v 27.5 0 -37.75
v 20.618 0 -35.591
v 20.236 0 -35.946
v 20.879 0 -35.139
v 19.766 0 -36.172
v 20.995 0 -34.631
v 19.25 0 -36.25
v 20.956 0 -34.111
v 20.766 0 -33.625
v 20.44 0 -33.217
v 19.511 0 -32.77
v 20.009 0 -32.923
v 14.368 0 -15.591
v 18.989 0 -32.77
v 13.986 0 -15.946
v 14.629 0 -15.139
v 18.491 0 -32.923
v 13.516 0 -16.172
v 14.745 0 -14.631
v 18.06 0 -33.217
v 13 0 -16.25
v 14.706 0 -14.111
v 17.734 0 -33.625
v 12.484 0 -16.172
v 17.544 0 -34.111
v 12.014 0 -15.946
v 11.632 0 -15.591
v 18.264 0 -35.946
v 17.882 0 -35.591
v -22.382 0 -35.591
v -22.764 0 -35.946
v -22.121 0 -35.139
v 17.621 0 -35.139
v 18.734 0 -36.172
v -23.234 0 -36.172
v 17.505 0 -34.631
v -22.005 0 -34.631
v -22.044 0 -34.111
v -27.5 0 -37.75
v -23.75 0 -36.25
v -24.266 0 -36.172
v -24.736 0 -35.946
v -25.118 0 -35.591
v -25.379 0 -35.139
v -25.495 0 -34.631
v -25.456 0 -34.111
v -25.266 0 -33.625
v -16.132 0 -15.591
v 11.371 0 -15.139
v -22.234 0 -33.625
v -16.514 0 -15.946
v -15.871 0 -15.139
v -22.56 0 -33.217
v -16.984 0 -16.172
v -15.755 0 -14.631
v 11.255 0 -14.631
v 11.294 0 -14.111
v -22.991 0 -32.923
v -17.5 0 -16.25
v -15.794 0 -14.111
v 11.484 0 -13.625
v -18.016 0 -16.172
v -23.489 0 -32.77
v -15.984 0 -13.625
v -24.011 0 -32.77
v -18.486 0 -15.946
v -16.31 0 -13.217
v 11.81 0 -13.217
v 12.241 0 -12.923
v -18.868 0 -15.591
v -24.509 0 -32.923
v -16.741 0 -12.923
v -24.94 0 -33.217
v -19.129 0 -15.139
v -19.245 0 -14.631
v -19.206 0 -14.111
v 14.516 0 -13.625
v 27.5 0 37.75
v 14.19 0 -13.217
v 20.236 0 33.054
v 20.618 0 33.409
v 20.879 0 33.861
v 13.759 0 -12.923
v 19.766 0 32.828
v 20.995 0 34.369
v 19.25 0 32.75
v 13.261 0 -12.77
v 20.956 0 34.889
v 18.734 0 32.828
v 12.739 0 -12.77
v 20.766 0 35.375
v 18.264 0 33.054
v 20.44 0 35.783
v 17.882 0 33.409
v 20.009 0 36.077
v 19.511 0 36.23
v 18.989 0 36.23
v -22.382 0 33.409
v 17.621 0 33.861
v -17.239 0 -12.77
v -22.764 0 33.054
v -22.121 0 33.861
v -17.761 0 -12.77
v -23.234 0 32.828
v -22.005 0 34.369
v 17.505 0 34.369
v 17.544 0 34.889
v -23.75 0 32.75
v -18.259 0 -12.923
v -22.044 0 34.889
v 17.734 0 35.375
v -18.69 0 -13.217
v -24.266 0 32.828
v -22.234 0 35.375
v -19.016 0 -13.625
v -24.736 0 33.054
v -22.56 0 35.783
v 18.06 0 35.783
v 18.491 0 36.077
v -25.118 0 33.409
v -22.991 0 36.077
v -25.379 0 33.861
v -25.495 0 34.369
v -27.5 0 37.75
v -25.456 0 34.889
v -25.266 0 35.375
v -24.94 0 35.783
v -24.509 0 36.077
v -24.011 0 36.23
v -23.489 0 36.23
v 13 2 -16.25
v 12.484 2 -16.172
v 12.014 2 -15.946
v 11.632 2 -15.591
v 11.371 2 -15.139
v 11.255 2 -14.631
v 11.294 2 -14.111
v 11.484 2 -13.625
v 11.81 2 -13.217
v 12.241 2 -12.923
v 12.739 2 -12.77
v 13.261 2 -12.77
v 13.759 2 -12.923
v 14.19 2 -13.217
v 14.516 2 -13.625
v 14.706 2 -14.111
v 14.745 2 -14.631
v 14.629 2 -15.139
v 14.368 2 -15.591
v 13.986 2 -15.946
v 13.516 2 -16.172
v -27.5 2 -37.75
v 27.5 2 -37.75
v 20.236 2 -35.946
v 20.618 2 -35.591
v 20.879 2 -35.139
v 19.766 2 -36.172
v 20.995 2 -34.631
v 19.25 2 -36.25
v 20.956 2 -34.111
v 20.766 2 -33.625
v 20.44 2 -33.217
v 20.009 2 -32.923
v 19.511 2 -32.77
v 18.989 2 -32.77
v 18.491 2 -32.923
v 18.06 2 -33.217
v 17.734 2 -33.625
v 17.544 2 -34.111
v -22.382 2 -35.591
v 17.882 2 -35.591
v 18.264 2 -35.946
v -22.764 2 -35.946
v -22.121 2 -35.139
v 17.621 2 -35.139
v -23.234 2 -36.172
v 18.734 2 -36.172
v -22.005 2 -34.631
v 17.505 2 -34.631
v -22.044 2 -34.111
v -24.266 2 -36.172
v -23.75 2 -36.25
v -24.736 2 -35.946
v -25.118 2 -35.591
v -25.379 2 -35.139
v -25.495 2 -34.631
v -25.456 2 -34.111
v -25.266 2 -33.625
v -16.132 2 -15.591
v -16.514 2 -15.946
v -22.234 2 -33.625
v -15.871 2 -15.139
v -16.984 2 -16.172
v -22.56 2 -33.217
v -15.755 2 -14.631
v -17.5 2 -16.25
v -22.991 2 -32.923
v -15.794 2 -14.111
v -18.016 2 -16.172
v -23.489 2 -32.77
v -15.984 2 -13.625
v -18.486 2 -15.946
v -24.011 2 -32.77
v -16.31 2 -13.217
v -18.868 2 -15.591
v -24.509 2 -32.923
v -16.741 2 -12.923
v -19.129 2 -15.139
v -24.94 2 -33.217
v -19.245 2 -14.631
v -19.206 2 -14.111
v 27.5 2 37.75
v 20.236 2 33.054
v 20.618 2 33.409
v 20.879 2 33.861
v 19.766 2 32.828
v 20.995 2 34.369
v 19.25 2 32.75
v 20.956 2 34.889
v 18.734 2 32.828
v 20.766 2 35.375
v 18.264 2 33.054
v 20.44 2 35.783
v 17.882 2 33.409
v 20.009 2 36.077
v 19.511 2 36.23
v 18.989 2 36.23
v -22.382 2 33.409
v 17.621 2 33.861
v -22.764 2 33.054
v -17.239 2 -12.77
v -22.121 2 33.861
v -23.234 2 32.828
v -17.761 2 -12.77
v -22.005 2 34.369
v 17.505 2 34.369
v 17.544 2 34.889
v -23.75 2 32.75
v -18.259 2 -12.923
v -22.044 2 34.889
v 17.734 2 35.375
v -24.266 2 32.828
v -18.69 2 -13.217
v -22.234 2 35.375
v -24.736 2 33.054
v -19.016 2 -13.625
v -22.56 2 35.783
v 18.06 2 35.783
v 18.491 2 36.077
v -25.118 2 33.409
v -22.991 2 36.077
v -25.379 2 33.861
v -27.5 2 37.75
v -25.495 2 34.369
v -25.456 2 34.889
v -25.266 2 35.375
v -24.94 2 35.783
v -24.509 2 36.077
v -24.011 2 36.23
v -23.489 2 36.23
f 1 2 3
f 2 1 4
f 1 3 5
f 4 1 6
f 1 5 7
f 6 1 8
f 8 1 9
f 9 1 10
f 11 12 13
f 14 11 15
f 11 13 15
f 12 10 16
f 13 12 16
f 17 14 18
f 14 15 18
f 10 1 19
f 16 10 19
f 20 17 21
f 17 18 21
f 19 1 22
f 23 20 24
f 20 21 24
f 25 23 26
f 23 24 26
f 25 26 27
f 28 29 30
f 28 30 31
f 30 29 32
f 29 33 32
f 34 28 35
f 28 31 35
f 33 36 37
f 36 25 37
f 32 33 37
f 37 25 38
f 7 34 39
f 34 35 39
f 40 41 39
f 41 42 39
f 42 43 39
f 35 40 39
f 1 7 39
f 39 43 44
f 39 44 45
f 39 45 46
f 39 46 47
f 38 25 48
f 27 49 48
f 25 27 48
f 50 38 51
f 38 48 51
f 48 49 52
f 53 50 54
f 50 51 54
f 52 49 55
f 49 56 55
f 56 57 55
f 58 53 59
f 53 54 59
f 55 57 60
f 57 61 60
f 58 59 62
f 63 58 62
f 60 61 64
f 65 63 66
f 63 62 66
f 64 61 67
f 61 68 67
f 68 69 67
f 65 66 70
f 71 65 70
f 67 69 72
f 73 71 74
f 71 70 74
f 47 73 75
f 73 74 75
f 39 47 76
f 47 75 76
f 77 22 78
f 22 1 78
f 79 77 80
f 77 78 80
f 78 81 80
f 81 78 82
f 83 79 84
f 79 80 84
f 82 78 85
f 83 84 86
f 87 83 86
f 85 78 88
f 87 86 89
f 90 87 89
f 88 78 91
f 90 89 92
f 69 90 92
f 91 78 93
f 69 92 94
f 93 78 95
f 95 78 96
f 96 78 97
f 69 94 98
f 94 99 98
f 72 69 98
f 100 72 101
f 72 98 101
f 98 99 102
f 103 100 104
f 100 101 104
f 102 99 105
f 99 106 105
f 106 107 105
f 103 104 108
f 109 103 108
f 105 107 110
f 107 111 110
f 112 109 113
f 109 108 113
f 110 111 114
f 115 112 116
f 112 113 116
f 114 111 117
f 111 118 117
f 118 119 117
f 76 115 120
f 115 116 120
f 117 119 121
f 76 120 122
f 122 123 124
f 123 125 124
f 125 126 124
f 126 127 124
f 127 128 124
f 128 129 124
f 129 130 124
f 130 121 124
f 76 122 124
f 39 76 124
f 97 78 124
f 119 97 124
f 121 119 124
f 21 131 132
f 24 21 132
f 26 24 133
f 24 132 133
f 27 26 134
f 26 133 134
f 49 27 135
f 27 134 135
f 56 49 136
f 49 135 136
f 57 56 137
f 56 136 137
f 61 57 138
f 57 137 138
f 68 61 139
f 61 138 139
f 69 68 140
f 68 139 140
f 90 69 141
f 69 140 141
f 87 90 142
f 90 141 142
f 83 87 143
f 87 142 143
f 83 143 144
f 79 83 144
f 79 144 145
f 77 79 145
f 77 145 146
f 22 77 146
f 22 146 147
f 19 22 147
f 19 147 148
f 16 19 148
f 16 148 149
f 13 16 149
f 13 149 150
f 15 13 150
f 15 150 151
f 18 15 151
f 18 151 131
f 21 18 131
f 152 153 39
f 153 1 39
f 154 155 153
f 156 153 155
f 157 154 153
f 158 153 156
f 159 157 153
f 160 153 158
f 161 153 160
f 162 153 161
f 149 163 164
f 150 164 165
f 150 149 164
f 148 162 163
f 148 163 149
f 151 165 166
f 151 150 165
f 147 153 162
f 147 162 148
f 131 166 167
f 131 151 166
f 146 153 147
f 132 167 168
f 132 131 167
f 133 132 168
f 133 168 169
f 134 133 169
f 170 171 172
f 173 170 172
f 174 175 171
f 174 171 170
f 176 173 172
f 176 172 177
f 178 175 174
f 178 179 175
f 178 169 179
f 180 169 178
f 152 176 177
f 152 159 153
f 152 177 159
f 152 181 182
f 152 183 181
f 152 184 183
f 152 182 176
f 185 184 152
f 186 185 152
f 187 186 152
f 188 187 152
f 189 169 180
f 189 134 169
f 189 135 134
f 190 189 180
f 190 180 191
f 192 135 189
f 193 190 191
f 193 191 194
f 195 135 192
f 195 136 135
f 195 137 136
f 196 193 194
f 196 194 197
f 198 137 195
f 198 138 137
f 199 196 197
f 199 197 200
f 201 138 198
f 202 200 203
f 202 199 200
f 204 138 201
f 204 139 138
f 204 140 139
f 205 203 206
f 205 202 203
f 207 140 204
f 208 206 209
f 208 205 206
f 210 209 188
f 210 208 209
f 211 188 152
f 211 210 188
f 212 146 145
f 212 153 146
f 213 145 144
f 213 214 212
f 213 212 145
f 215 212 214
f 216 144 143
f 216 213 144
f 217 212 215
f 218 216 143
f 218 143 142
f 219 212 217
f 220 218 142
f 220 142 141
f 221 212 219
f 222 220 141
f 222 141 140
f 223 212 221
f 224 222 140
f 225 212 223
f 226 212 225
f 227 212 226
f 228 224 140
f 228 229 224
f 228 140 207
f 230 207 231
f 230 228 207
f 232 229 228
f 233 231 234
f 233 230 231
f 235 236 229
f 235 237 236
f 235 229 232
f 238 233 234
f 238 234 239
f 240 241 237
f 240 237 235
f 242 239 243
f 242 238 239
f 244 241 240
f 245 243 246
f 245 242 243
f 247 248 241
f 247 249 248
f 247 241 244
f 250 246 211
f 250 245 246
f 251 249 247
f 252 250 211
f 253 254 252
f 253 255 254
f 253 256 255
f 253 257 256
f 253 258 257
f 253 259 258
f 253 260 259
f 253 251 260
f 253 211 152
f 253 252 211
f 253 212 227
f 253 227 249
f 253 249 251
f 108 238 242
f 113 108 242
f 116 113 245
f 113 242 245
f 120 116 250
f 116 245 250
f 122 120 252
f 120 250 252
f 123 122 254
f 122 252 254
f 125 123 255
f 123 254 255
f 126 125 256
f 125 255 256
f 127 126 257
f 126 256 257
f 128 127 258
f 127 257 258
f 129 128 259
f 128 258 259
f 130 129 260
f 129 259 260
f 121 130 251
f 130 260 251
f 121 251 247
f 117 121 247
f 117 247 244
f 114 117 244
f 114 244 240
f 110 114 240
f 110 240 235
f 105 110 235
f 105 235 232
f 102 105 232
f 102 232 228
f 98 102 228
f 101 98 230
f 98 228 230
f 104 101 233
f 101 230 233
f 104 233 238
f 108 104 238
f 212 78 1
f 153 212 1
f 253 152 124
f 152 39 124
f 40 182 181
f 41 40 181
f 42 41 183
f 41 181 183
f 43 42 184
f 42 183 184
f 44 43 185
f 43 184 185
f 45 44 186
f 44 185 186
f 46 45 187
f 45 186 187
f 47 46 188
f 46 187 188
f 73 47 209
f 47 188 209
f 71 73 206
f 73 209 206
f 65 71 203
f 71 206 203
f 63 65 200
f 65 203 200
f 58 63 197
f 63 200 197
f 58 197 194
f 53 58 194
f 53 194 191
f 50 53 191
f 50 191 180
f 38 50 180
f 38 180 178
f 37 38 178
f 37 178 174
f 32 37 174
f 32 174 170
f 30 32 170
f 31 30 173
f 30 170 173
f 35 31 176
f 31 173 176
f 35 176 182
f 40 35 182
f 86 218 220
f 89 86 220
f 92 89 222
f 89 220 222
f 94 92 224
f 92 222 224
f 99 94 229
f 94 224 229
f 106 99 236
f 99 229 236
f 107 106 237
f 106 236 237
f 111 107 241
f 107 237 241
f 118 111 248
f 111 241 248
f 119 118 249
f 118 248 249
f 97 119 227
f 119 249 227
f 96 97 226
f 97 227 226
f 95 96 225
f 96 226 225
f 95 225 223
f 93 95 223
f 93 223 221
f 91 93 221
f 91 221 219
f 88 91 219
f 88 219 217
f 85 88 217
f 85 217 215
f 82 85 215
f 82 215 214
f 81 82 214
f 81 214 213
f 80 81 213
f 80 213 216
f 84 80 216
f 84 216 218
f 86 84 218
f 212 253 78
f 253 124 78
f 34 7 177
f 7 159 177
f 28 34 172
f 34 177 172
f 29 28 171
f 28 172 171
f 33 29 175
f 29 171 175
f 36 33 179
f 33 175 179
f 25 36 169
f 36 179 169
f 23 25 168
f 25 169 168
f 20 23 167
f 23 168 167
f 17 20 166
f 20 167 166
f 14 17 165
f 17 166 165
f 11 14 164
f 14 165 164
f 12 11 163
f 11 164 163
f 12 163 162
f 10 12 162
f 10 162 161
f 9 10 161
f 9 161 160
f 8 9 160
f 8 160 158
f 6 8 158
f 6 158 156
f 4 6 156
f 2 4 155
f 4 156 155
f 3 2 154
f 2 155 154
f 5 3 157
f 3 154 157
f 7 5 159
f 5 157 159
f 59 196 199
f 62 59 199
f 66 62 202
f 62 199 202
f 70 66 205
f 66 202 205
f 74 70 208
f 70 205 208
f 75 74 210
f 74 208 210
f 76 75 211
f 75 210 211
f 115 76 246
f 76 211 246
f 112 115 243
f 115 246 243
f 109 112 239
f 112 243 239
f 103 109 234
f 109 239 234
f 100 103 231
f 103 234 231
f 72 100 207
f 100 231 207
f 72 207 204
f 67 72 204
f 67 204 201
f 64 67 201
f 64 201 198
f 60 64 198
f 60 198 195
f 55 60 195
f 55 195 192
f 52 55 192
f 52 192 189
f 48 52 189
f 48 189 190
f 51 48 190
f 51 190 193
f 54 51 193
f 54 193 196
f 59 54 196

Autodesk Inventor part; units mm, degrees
ref_plane "YZ Plane" through (0, 0, 0) normal (1, 0, 0) x (0, 1, 0)
ref_plane "XZ Plane" through (0, 0, 0) normal (0, 1, 0) x (-1, 0, 0)
ref_plane "XY Plane" through (0, 0, 0) normal (0, 0, 1) x (1, 0, 0)
sketch "Szkic1" plane through (0, 0, 0) normal (0, 1, 0) x (-1, 0, 0)
  line L0 (-27.5, -37.75) -> (27.5, -37.75)
  line L1 (27.5, -37.75) -> (27.5, 37.75)
  line L2 (27.5, 37.75) -> (-27.5, 37.75)
  line L3 (-27.5, 37.75) -> (-27.5, -37.75)
  line L4 (-27.5, -37.75) -> (27.5, 37.75) construction
  line L5 (27.5, -37.75) -> (-27.5, 37.75) construction
  point P0 (0, 0)
  dimension "d0" = 55
  dimension "d1" = 75.5
extrude "Wyciągnięcie proste1" add sketch "Szkic1" along normal blind 2
sketch "Szkic2" plane through (0, 0, 0) normal (0, -1, 0) x (1, 0, 0)
  line L0 (15.75, -7.5) -> (15.75, -11.75) projected
  line L1 (15.75, -11.75) -> (13, -11.75) projected
  arc A0 (13, -11.75) -> (13, -17.25) centre (13, -14.5) ccw projected
  line L2 (13, -17.25) -> (15.75, -17.25) projected
  line L3 (15.75, -17.25) -> (15.75, -21.5) projected
  line L4 (15.75, -21.5) -> (-20.25, -21.5) projected
  line L5 (-20.25, -21.5) -> (-20.25, -17.25) projected
  line L6 (-20.25, -17.25) -> (-17.5, -17.25) projected
  arc A1 (-17.5, -17.25) -> (-17.5, -11.75) centre (-17.5, -14.5) ccw projected
  line L7 (-17.5, -11.75) -> (-20.25, -11.75) projected
  line L8 (-20.25, -11.75) -> (-20.25, -7.5) projected
  line L9 (-20.25, -7.5) -> (15.75, -7.5) projected
  circle A2 centre (-17.5, -14.5) radius 1.75 projected
  circle A3 centre (19.25, -34.5) radius 1.75 projected
  circle A4 centre (-23.75, 34.5) radius 1.75 projected
  circle A5 centre (-23.75, -34.5) radius 1.75 projected
  circle A6 centre (19.25, 34.5) radius 1.75 projected
  circle A7 centre (13, -14.5) radius 1.75 projected
  line L10 (23, -37.75) -> (-27.5, -37.75) projected
  line L11 (23, 37.75) -> (23, -37.75) projected
  line L12 (-27.5, 37.75) -> (23, 37.75) projected
  line L13 (-27.5, -37.75) -> (-27.5, 37.75) projected
  line L14 (-20.25, -21.5) -> (15.75, -21.5) projected
  point P0 (0, 0)
hole "Otwór1" at (19.25, 0, 34.5) at (19.25, 0, -34.5) at (13, 0, -14.5) at (-17.5, 0, -14.5) at (-23.75, 0, -34.5) at (-23.75, 0, 34.5) direction (0, 1, 0) diameter 3.5 end through all
properties part number "blacha pionowa ste driver"
